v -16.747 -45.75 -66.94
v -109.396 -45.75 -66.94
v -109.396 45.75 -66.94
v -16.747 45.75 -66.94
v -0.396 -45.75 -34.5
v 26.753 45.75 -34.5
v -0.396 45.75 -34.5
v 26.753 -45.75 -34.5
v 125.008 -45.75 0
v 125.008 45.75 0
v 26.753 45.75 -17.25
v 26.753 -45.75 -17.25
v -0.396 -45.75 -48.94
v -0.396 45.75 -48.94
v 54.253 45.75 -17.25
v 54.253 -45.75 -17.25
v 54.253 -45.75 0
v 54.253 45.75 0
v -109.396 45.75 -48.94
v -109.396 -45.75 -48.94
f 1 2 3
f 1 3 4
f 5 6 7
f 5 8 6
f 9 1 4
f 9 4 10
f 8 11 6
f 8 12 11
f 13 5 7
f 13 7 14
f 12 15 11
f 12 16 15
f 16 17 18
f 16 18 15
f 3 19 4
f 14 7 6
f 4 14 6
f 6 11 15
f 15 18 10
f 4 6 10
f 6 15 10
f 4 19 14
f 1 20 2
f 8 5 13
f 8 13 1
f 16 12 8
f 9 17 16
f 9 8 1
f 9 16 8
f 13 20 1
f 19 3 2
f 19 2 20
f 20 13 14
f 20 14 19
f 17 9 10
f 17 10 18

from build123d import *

# Parameters (mm, degrees)
F1_DEPTH = 45.75
F0_W     = 92.649092
F0_H     = 18
F2_DEPTH = 45.75


with BuildPart() as f1:
    # F0 (on Front) → F1 (new body, symmetric)
    with BuildSketch(Plane.XZ):
        Polygon((26.753499, -34.5), (-0.395593, -34.5), (-0.395593, -48.93963), (-16.746501, -48.93963), (-16.746501, -66.93963), (125.007659, 0), (54.253499, 0), (54.253499, -17.25), (26.753499, -17.25), align=None)
    extrude(amount=F1_DEPTH, both=True)

    # F0 (on Front) → F2 (join, symmetric)
    with BuildSketch(Plane.XZ):
        Polygon((26.753499, -34.5), (-0.395593, -34.5), (-0.395593, -48.93963), (-16.746501, -48.93963), (-16.746501, -66.93963), (125.007659, 0), (54.253499, 0), (54.253499, -17.25), (26.753499, -17.25), align=None)
        with Locations((-63.071047, -57.93963)):
            Rectangle(F0_W, F0_H)
    extrude(amount=F2_DEPTH, both=True)


solid = f1.part
